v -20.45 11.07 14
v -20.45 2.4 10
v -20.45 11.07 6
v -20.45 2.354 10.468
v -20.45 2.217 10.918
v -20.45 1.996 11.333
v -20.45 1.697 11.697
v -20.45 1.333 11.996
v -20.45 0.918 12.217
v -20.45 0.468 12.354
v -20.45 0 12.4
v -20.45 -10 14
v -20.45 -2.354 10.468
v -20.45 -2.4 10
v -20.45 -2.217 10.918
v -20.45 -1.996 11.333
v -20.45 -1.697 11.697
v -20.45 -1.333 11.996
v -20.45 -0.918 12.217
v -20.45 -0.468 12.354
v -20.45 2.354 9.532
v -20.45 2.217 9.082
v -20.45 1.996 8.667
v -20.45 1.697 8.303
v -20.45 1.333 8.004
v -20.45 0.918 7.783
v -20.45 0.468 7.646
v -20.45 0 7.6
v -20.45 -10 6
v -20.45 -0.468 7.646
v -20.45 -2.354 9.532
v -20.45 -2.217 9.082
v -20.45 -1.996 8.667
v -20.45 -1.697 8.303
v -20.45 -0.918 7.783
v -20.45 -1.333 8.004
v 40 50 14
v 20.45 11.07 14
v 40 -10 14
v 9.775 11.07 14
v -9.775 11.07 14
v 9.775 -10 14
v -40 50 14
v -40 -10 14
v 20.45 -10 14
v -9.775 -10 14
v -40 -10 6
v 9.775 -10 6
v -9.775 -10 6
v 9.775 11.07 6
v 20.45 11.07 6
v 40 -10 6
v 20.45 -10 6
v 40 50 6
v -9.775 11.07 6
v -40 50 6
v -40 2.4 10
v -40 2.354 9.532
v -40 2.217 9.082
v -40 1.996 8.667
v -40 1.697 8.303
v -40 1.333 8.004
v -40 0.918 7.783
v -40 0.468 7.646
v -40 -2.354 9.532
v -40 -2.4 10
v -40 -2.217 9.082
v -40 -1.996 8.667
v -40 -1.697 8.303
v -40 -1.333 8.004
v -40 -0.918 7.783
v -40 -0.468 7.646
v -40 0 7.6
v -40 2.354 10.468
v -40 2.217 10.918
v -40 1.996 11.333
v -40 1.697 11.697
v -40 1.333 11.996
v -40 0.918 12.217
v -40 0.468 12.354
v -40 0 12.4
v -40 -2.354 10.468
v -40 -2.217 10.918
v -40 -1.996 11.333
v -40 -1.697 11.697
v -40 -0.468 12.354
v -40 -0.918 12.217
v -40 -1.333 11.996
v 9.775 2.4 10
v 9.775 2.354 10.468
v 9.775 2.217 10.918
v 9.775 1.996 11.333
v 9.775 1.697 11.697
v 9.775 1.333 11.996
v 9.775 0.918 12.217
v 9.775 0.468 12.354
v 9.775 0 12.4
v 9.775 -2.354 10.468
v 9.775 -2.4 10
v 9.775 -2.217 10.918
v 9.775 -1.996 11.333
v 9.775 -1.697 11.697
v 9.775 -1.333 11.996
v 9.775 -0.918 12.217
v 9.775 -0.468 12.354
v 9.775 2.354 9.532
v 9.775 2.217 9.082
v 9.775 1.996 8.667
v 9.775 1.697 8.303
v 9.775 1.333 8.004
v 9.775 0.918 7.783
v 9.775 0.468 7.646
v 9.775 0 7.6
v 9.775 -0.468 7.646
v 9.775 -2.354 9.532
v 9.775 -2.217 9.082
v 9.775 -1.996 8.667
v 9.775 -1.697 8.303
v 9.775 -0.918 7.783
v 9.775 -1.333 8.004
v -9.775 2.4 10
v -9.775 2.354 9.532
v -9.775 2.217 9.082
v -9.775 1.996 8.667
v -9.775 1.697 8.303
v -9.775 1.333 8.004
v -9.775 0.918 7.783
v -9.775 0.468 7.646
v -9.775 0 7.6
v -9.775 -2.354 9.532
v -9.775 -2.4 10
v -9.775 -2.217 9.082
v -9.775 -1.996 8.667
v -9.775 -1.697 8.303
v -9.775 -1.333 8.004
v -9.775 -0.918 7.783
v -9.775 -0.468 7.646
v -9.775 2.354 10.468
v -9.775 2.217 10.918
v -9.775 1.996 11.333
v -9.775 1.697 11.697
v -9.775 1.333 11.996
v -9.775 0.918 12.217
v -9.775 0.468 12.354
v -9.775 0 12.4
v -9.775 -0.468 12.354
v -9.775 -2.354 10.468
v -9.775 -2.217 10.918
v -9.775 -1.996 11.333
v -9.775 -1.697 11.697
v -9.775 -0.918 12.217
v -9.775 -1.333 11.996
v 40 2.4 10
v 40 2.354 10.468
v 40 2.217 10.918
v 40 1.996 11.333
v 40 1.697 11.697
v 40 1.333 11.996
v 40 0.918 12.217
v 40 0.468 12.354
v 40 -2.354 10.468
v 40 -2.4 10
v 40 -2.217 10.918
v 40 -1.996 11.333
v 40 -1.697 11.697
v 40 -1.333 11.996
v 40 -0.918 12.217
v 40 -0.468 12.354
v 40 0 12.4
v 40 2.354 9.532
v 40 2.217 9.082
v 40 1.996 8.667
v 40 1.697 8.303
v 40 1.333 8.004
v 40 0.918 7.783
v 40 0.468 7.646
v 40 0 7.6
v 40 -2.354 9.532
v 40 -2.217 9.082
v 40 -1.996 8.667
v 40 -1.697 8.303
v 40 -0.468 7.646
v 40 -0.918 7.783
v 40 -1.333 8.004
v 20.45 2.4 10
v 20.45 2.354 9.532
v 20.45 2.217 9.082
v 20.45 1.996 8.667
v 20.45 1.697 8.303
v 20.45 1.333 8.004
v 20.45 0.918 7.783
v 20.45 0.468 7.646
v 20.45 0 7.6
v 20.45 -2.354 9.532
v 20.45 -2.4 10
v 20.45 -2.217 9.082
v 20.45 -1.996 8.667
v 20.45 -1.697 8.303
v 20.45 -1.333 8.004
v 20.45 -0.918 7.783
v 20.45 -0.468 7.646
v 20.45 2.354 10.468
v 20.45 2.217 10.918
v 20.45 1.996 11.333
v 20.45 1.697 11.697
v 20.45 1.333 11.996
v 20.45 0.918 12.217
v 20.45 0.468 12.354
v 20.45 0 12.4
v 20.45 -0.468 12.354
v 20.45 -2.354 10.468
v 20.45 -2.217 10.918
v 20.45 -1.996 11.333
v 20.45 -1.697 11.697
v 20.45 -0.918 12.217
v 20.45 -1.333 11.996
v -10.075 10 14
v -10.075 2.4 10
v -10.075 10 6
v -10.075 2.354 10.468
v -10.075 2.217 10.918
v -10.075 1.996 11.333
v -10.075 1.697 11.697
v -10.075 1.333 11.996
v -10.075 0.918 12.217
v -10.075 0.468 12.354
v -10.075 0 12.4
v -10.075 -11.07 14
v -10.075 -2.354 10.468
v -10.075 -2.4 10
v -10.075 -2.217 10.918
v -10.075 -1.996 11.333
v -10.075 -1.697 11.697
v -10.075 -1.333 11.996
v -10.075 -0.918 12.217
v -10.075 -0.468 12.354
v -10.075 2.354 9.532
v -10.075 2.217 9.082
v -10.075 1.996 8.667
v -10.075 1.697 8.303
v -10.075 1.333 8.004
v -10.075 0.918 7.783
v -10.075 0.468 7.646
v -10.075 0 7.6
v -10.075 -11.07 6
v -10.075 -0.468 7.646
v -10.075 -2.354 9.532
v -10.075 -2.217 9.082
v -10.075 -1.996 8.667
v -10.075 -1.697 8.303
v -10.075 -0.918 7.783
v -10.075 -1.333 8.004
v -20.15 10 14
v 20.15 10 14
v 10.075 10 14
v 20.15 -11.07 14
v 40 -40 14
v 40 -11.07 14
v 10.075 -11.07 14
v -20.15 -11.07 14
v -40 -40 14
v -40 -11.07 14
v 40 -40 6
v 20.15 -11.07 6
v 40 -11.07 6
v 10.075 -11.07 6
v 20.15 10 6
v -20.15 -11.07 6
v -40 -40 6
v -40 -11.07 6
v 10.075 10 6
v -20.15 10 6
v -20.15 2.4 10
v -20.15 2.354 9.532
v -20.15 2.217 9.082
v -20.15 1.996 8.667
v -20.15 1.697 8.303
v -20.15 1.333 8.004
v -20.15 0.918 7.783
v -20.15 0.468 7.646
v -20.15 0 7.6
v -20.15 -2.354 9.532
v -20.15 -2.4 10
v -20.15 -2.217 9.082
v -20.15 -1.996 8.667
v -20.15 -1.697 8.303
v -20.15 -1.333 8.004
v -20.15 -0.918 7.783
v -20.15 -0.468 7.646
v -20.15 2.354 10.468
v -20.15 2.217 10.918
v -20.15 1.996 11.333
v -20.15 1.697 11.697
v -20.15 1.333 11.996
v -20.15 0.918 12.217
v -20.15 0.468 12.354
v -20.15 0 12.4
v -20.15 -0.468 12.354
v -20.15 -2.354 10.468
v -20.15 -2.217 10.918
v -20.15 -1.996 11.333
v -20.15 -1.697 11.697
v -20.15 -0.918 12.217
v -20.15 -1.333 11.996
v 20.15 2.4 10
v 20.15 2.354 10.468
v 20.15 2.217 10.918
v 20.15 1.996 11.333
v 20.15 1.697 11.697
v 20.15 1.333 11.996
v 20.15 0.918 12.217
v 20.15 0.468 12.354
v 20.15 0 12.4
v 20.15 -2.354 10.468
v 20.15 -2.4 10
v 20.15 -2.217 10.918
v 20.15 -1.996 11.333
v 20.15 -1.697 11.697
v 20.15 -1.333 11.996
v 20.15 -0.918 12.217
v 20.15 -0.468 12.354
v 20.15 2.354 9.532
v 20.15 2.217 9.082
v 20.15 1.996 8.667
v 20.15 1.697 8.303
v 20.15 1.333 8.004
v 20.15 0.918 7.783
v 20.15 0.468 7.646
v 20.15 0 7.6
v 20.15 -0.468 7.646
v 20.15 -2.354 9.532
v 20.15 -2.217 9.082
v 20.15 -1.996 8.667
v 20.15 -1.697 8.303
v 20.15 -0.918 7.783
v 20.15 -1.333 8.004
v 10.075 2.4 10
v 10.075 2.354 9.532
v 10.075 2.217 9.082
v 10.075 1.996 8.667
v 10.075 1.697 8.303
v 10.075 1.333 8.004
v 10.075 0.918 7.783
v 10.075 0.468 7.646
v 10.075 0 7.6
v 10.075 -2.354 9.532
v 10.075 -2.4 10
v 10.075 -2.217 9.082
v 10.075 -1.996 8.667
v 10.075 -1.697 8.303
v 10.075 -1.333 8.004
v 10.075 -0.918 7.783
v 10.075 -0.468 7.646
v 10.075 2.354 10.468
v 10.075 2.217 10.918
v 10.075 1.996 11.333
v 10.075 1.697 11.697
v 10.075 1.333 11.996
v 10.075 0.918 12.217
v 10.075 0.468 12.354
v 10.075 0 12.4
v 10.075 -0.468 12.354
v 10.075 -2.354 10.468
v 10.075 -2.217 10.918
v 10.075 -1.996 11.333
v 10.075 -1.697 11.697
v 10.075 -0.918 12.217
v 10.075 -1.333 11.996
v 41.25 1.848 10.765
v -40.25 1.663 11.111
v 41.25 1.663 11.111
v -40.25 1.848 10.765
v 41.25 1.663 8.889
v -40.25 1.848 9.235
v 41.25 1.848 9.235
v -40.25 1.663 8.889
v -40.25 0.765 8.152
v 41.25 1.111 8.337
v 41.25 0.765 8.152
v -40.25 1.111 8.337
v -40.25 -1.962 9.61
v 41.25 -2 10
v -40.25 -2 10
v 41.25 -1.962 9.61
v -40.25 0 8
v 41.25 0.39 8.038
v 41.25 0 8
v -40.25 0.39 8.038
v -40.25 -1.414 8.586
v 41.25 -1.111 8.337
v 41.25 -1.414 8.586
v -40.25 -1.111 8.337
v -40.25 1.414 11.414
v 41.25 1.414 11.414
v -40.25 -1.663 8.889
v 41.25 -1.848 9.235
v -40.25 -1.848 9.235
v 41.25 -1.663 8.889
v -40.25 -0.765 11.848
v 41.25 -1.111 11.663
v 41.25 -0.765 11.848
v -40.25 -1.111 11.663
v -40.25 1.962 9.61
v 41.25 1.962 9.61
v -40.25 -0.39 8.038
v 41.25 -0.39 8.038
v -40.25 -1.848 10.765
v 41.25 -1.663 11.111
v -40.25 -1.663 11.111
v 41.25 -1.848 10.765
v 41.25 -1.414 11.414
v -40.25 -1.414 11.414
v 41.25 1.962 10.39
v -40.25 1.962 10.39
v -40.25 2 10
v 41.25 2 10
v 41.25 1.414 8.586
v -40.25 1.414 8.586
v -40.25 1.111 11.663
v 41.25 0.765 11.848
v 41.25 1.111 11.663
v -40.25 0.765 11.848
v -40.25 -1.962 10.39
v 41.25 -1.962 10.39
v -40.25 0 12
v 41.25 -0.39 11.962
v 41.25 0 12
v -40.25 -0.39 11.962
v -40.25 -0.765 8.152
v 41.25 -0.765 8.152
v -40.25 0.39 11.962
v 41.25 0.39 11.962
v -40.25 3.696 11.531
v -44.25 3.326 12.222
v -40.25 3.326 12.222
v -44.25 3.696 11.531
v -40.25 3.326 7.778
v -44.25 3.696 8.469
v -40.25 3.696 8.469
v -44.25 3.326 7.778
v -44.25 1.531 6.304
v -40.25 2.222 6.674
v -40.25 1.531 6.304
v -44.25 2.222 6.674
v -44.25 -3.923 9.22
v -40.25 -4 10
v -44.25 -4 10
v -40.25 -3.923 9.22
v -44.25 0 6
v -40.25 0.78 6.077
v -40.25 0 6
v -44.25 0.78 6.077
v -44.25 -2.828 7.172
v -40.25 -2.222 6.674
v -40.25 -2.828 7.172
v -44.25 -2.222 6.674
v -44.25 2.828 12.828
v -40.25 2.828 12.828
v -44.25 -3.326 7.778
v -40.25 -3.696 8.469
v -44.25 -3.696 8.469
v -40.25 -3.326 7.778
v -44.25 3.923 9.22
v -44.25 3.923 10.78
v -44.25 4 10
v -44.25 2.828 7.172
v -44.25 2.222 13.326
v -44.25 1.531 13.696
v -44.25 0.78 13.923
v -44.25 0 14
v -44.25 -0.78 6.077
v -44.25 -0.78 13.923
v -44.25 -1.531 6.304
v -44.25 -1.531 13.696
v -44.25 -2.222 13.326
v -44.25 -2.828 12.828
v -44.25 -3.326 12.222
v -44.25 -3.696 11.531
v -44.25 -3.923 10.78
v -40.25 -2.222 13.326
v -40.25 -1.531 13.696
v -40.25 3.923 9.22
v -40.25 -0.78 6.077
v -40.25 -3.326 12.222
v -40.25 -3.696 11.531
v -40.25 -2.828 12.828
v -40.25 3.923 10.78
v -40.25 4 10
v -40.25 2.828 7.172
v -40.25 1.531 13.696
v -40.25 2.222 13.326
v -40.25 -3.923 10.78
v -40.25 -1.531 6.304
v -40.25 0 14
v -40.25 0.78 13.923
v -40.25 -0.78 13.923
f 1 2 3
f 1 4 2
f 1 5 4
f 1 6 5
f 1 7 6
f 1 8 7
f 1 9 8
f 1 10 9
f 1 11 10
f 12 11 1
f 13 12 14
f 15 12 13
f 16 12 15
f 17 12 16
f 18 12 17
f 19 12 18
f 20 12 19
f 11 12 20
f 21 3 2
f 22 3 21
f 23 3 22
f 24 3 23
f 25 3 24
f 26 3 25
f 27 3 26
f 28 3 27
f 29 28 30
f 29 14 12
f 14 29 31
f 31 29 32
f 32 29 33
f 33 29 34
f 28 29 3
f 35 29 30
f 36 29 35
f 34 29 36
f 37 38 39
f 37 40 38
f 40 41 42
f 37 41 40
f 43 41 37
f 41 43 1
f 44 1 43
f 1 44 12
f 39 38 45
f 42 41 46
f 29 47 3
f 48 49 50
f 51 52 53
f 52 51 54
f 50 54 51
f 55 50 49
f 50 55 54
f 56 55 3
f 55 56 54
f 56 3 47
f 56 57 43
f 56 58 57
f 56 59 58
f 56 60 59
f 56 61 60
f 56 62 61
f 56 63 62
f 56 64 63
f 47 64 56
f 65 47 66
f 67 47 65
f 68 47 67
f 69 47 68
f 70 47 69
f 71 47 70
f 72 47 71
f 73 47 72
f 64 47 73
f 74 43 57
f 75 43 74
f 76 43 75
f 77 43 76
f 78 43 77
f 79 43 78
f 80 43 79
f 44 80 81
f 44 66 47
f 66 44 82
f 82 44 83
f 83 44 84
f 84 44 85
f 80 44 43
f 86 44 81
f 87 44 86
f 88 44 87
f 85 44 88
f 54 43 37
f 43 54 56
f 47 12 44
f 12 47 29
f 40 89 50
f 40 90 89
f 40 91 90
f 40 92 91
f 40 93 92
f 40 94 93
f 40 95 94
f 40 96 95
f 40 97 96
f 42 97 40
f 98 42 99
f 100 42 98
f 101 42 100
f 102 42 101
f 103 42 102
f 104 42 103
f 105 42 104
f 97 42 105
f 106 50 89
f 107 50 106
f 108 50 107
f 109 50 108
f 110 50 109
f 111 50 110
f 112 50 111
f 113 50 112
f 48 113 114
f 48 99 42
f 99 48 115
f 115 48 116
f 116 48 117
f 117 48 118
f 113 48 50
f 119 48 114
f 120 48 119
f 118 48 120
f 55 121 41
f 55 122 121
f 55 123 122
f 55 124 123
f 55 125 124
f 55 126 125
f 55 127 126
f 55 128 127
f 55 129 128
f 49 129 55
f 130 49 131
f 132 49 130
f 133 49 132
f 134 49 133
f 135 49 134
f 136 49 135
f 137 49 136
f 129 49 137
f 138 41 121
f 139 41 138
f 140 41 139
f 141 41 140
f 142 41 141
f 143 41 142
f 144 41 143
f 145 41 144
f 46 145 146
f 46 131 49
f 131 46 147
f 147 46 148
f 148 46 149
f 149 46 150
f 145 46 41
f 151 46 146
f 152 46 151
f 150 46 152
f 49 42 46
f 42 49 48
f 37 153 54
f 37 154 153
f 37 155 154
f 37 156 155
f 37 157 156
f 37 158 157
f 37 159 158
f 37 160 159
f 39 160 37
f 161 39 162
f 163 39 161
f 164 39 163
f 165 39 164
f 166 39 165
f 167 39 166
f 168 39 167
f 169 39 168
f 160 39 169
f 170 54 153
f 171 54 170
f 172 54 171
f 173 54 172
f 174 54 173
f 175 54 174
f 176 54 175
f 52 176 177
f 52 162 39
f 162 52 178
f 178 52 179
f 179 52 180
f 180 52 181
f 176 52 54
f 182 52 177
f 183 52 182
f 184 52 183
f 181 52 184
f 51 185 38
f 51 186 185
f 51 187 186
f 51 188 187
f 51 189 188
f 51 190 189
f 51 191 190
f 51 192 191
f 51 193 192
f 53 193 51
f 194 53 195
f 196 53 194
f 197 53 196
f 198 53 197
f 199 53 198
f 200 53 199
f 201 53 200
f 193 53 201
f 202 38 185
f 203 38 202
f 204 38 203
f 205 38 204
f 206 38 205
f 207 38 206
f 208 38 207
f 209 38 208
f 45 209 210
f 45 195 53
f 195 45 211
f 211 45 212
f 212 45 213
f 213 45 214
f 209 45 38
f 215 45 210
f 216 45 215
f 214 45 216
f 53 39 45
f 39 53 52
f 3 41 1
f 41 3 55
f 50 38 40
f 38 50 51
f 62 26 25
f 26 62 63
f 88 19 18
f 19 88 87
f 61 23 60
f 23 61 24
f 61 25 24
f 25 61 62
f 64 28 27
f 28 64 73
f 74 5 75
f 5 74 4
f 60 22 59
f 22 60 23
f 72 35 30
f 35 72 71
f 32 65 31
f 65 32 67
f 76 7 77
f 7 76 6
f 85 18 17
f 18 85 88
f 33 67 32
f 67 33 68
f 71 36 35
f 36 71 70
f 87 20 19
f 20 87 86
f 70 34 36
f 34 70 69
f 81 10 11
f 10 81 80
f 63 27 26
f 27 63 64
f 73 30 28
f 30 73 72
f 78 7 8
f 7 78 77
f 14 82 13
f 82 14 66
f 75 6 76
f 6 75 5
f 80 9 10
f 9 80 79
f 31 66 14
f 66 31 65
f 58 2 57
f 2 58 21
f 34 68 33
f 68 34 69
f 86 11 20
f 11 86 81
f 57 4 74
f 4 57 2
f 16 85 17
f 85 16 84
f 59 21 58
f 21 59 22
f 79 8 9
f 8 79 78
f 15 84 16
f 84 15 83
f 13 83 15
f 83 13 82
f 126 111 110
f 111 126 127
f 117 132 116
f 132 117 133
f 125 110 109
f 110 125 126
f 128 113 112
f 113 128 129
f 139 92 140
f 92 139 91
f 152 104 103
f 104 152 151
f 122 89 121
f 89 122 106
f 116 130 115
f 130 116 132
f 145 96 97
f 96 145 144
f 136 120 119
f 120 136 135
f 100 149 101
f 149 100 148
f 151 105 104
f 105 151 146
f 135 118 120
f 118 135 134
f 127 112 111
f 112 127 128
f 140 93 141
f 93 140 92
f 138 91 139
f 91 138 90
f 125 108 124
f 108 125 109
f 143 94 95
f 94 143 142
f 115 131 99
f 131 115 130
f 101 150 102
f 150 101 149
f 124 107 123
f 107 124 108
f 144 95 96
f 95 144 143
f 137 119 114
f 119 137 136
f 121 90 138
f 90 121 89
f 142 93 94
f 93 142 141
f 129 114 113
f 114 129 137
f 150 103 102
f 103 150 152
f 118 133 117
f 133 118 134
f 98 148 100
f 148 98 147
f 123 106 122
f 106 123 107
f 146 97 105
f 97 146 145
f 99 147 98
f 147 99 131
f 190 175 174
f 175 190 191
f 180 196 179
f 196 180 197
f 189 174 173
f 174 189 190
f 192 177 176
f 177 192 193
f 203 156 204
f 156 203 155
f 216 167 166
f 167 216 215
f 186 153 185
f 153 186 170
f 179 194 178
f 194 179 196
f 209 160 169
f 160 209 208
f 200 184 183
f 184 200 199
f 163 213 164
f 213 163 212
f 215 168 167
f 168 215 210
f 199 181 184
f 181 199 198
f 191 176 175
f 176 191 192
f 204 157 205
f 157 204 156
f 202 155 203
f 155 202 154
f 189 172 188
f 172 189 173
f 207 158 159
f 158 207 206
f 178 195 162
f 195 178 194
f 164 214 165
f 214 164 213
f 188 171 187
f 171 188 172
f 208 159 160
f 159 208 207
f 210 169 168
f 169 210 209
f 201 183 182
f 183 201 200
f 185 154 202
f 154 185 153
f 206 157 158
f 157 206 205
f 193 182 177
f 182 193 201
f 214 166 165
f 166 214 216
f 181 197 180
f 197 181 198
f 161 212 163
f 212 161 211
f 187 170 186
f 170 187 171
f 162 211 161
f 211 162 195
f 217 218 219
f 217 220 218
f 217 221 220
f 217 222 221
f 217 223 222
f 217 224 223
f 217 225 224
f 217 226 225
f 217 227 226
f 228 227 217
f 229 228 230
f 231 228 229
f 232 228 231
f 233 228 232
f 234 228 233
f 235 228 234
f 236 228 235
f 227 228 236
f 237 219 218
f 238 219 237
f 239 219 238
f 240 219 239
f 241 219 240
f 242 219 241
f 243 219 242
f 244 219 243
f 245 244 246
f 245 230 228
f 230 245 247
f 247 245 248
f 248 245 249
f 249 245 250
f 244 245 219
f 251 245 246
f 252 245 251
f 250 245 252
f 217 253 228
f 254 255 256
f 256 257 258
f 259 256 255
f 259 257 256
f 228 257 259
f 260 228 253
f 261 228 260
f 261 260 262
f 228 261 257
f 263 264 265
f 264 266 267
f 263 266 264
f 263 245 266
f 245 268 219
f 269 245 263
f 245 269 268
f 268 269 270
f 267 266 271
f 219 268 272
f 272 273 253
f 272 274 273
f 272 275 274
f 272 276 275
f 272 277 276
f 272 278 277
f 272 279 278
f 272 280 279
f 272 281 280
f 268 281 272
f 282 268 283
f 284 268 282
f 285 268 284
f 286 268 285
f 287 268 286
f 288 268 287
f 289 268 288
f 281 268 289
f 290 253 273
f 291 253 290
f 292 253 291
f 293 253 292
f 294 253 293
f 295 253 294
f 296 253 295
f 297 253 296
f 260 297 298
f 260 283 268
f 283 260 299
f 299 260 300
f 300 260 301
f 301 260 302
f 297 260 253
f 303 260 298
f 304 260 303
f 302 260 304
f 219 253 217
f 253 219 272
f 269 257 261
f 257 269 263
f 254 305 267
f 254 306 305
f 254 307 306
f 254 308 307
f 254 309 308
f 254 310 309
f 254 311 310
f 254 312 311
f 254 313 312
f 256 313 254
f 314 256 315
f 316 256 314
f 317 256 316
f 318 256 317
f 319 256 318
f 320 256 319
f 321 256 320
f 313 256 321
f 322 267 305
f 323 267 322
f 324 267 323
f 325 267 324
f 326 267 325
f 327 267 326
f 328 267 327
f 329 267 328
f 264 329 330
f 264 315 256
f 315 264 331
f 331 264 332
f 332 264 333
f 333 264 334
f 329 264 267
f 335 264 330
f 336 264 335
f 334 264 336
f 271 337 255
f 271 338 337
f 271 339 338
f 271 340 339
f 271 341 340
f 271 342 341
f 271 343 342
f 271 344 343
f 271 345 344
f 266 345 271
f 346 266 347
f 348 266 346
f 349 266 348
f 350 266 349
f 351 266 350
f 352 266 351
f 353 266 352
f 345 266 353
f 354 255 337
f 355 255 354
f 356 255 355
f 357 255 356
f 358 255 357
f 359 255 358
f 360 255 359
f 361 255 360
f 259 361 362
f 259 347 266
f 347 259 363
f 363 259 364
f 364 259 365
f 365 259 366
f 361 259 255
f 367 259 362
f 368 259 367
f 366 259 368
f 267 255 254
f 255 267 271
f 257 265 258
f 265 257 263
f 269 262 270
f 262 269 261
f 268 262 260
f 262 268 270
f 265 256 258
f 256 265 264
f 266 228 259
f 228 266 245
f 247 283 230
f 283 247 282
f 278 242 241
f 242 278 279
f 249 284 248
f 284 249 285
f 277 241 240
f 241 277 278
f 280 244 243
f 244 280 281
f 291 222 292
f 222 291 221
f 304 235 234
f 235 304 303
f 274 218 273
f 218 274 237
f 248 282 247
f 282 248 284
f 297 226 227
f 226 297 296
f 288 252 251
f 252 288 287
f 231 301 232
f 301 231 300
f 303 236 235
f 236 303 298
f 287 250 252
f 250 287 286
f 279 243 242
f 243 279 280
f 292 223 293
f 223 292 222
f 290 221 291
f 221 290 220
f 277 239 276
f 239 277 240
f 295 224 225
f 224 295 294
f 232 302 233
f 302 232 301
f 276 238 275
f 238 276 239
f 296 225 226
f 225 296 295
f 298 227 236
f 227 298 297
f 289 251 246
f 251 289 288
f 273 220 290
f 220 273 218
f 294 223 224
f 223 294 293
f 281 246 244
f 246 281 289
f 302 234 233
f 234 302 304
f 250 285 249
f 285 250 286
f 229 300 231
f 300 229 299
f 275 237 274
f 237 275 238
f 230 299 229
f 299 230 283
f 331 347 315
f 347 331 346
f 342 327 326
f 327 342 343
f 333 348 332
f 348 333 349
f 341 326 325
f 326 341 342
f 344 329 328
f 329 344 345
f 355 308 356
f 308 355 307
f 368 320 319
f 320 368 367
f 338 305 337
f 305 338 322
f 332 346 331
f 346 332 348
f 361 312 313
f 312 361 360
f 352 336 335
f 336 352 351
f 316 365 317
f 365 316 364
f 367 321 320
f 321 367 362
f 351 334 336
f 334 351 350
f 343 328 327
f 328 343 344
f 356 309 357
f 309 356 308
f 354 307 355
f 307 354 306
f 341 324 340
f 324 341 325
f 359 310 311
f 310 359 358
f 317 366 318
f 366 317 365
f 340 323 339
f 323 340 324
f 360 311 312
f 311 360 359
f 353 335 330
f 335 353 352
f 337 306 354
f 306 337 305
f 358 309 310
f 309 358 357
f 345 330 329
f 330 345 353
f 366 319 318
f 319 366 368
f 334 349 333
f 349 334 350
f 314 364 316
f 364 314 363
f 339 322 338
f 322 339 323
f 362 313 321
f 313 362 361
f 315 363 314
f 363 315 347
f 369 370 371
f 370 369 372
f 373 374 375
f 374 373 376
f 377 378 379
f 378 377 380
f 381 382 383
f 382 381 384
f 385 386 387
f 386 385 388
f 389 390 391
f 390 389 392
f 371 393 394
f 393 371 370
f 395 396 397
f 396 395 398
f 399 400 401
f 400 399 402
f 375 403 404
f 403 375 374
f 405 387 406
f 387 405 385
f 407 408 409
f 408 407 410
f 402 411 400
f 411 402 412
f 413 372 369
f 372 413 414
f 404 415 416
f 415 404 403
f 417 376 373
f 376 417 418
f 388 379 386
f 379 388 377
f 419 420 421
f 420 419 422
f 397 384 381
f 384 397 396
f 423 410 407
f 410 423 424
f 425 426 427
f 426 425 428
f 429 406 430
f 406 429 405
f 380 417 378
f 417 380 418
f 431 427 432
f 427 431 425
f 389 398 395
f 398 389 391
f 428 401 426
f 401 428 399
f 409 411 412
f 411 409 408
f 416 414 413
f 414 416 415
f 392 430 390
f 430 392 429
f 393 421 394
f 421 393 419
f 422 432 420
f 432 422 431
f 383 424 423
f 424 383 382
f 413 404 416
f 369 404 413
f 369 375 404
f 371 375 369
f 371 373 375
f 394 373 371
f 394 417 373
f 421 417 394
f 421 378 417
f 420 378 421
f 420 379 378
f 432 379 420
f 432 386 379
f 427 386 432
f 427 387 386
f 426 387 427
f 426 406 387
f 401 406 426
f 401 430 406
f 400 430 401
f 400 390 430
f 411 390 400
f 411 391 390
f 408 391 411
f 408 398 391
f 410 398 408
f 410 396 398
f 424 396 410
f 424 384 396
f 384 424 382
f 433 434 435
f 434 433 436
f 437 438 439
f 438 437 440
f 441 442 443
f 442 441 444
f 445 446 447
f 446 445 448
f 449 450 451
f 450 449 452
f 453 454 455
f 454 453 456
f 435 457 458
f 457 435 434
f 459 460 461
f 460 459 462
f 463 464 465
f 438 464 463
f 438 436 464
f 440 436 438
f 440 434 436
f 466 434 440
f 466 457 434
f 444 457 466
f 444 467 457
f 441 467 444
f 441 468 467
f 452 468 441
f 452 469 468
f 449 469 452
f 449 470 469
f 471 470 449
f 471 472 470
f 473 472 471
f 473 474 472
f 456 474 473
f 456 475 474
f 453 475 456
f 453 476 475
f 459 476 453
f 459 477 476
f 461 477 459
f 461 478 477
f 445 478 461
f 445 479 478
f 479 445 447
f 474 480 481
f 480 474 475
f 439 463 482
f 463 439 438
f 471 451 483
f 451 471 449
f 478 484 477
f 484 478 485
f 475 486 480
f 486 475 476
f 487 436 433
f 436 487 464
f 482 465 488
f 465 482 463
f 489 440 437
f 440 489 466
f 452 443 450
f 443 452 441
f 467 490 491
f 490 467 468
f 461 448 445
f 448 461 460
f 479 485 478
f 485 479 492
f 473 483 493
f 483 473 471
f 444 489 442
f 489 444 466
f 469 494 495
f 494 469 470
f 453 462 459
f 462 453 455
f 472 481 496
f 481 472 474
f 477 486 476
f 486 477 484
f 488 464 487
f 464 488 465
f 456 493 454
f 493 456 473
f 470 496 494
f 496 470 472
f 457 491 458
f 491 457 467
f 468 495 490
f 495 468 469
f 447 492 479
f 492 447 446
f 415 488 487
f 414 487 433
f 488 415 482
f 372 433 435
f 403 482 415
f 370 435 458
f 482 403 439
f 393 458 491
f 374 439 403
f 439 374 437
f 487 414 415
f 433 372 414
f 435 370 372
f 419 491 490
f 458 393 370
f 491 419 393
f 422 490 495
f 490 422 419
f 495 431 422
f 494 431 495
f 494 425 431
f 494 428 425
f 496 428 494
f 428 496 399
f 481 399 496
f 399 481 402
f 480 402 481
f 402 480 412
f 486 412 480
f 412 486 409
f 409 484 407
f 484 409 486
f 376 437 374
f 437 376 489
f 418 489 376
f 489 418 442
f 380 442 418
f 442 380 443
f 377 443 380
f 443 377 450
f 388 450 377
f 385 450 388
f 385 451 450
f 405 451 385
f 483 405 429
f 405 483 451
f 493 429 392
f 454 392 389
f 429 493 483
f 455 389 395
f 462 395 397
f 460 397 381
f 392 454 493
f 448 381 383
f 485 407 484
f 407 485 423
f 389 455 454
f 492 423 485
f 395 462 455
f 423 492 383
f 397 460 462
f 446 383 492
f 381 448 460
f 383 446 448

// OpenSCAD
$fn = 32;

// ------------------------------------------------------------------------
// Butt hinge: hinge 80 mm, leaf swung 0 deg
// Every part is its own module, assembly() places every instance.
// ------------------------------------------------------------------------

// --- part 1 ---
module hinge_base() {
  difference() {
    union() {
      translate([-40, -10, -4]) cube([19.55, 60, 8]);
      translate([-9.775, -10, -4]) cube([19.55, 60, 8]);
      translate([20.45, -10, -4]) cube([19.55, 60, 8]);
      translate([-40, 11.07, -4]) cube([80, 38.93, 8]);
    }
    translate([-30.225, 0, 0]) rotate([0, 90, 0]) cylinder(h = 21.55, d = 4.8, center = true);
    translate([0, 0, 0]) rotate([0, 90, 0]) cylinder(h = 21.55, d = 4.8, center = true);
    translate([30.225, 0, 0]) rotate([0, 90, 0]) cylinder(h = 21.55, d = 4.8, center = true);
  }
}

// --- part 2 ---
module hinge_mover() {
  difference() {
    union() {
      translate([-20.15, -40, -4]) cube([10.075, 50, 8]);
      translate([10.075, -40, -4]) cube([10.075, 50, 8]);
      translate([-40, -40, -4]) cube([80, 28.93, 8]);
    }
    translate([-15.113, 0, 0]) rotate([0, 90, 0]) cylinder(h = 12.075, d = 4.8, center = true);
    translate([15.113, 0, 0]) rotate([0, 90, 0]) cylinder(h = 12.075, d = 4.8, center = true);
  }
}

// --- part 3 ---
module hinge_pin() {
  rotate([0, 90, 0]) cylinder(h = 82.5, d = 4, center = true);
  translate([-44.25, 0, 0]) rotate([0, 90, 0]) cylinder(h = 4, d = 8);
}

// --- assembly ---
module assembly() {
  color([0.80, 0.24, 0.20]) translate([0, 0, 10]) rotate([0, 0, 0]) hinge_base();
  color([0.20, 0.45, 0.75]) translate([0, 0, 10]) rotate([0, 0, 0]) hinge_mover();
  color([0.25, 0.62, 0.32]) translate([0, 0, 10]) rotate([0, 0, 0]) hinge_pin();
}

assembly();
